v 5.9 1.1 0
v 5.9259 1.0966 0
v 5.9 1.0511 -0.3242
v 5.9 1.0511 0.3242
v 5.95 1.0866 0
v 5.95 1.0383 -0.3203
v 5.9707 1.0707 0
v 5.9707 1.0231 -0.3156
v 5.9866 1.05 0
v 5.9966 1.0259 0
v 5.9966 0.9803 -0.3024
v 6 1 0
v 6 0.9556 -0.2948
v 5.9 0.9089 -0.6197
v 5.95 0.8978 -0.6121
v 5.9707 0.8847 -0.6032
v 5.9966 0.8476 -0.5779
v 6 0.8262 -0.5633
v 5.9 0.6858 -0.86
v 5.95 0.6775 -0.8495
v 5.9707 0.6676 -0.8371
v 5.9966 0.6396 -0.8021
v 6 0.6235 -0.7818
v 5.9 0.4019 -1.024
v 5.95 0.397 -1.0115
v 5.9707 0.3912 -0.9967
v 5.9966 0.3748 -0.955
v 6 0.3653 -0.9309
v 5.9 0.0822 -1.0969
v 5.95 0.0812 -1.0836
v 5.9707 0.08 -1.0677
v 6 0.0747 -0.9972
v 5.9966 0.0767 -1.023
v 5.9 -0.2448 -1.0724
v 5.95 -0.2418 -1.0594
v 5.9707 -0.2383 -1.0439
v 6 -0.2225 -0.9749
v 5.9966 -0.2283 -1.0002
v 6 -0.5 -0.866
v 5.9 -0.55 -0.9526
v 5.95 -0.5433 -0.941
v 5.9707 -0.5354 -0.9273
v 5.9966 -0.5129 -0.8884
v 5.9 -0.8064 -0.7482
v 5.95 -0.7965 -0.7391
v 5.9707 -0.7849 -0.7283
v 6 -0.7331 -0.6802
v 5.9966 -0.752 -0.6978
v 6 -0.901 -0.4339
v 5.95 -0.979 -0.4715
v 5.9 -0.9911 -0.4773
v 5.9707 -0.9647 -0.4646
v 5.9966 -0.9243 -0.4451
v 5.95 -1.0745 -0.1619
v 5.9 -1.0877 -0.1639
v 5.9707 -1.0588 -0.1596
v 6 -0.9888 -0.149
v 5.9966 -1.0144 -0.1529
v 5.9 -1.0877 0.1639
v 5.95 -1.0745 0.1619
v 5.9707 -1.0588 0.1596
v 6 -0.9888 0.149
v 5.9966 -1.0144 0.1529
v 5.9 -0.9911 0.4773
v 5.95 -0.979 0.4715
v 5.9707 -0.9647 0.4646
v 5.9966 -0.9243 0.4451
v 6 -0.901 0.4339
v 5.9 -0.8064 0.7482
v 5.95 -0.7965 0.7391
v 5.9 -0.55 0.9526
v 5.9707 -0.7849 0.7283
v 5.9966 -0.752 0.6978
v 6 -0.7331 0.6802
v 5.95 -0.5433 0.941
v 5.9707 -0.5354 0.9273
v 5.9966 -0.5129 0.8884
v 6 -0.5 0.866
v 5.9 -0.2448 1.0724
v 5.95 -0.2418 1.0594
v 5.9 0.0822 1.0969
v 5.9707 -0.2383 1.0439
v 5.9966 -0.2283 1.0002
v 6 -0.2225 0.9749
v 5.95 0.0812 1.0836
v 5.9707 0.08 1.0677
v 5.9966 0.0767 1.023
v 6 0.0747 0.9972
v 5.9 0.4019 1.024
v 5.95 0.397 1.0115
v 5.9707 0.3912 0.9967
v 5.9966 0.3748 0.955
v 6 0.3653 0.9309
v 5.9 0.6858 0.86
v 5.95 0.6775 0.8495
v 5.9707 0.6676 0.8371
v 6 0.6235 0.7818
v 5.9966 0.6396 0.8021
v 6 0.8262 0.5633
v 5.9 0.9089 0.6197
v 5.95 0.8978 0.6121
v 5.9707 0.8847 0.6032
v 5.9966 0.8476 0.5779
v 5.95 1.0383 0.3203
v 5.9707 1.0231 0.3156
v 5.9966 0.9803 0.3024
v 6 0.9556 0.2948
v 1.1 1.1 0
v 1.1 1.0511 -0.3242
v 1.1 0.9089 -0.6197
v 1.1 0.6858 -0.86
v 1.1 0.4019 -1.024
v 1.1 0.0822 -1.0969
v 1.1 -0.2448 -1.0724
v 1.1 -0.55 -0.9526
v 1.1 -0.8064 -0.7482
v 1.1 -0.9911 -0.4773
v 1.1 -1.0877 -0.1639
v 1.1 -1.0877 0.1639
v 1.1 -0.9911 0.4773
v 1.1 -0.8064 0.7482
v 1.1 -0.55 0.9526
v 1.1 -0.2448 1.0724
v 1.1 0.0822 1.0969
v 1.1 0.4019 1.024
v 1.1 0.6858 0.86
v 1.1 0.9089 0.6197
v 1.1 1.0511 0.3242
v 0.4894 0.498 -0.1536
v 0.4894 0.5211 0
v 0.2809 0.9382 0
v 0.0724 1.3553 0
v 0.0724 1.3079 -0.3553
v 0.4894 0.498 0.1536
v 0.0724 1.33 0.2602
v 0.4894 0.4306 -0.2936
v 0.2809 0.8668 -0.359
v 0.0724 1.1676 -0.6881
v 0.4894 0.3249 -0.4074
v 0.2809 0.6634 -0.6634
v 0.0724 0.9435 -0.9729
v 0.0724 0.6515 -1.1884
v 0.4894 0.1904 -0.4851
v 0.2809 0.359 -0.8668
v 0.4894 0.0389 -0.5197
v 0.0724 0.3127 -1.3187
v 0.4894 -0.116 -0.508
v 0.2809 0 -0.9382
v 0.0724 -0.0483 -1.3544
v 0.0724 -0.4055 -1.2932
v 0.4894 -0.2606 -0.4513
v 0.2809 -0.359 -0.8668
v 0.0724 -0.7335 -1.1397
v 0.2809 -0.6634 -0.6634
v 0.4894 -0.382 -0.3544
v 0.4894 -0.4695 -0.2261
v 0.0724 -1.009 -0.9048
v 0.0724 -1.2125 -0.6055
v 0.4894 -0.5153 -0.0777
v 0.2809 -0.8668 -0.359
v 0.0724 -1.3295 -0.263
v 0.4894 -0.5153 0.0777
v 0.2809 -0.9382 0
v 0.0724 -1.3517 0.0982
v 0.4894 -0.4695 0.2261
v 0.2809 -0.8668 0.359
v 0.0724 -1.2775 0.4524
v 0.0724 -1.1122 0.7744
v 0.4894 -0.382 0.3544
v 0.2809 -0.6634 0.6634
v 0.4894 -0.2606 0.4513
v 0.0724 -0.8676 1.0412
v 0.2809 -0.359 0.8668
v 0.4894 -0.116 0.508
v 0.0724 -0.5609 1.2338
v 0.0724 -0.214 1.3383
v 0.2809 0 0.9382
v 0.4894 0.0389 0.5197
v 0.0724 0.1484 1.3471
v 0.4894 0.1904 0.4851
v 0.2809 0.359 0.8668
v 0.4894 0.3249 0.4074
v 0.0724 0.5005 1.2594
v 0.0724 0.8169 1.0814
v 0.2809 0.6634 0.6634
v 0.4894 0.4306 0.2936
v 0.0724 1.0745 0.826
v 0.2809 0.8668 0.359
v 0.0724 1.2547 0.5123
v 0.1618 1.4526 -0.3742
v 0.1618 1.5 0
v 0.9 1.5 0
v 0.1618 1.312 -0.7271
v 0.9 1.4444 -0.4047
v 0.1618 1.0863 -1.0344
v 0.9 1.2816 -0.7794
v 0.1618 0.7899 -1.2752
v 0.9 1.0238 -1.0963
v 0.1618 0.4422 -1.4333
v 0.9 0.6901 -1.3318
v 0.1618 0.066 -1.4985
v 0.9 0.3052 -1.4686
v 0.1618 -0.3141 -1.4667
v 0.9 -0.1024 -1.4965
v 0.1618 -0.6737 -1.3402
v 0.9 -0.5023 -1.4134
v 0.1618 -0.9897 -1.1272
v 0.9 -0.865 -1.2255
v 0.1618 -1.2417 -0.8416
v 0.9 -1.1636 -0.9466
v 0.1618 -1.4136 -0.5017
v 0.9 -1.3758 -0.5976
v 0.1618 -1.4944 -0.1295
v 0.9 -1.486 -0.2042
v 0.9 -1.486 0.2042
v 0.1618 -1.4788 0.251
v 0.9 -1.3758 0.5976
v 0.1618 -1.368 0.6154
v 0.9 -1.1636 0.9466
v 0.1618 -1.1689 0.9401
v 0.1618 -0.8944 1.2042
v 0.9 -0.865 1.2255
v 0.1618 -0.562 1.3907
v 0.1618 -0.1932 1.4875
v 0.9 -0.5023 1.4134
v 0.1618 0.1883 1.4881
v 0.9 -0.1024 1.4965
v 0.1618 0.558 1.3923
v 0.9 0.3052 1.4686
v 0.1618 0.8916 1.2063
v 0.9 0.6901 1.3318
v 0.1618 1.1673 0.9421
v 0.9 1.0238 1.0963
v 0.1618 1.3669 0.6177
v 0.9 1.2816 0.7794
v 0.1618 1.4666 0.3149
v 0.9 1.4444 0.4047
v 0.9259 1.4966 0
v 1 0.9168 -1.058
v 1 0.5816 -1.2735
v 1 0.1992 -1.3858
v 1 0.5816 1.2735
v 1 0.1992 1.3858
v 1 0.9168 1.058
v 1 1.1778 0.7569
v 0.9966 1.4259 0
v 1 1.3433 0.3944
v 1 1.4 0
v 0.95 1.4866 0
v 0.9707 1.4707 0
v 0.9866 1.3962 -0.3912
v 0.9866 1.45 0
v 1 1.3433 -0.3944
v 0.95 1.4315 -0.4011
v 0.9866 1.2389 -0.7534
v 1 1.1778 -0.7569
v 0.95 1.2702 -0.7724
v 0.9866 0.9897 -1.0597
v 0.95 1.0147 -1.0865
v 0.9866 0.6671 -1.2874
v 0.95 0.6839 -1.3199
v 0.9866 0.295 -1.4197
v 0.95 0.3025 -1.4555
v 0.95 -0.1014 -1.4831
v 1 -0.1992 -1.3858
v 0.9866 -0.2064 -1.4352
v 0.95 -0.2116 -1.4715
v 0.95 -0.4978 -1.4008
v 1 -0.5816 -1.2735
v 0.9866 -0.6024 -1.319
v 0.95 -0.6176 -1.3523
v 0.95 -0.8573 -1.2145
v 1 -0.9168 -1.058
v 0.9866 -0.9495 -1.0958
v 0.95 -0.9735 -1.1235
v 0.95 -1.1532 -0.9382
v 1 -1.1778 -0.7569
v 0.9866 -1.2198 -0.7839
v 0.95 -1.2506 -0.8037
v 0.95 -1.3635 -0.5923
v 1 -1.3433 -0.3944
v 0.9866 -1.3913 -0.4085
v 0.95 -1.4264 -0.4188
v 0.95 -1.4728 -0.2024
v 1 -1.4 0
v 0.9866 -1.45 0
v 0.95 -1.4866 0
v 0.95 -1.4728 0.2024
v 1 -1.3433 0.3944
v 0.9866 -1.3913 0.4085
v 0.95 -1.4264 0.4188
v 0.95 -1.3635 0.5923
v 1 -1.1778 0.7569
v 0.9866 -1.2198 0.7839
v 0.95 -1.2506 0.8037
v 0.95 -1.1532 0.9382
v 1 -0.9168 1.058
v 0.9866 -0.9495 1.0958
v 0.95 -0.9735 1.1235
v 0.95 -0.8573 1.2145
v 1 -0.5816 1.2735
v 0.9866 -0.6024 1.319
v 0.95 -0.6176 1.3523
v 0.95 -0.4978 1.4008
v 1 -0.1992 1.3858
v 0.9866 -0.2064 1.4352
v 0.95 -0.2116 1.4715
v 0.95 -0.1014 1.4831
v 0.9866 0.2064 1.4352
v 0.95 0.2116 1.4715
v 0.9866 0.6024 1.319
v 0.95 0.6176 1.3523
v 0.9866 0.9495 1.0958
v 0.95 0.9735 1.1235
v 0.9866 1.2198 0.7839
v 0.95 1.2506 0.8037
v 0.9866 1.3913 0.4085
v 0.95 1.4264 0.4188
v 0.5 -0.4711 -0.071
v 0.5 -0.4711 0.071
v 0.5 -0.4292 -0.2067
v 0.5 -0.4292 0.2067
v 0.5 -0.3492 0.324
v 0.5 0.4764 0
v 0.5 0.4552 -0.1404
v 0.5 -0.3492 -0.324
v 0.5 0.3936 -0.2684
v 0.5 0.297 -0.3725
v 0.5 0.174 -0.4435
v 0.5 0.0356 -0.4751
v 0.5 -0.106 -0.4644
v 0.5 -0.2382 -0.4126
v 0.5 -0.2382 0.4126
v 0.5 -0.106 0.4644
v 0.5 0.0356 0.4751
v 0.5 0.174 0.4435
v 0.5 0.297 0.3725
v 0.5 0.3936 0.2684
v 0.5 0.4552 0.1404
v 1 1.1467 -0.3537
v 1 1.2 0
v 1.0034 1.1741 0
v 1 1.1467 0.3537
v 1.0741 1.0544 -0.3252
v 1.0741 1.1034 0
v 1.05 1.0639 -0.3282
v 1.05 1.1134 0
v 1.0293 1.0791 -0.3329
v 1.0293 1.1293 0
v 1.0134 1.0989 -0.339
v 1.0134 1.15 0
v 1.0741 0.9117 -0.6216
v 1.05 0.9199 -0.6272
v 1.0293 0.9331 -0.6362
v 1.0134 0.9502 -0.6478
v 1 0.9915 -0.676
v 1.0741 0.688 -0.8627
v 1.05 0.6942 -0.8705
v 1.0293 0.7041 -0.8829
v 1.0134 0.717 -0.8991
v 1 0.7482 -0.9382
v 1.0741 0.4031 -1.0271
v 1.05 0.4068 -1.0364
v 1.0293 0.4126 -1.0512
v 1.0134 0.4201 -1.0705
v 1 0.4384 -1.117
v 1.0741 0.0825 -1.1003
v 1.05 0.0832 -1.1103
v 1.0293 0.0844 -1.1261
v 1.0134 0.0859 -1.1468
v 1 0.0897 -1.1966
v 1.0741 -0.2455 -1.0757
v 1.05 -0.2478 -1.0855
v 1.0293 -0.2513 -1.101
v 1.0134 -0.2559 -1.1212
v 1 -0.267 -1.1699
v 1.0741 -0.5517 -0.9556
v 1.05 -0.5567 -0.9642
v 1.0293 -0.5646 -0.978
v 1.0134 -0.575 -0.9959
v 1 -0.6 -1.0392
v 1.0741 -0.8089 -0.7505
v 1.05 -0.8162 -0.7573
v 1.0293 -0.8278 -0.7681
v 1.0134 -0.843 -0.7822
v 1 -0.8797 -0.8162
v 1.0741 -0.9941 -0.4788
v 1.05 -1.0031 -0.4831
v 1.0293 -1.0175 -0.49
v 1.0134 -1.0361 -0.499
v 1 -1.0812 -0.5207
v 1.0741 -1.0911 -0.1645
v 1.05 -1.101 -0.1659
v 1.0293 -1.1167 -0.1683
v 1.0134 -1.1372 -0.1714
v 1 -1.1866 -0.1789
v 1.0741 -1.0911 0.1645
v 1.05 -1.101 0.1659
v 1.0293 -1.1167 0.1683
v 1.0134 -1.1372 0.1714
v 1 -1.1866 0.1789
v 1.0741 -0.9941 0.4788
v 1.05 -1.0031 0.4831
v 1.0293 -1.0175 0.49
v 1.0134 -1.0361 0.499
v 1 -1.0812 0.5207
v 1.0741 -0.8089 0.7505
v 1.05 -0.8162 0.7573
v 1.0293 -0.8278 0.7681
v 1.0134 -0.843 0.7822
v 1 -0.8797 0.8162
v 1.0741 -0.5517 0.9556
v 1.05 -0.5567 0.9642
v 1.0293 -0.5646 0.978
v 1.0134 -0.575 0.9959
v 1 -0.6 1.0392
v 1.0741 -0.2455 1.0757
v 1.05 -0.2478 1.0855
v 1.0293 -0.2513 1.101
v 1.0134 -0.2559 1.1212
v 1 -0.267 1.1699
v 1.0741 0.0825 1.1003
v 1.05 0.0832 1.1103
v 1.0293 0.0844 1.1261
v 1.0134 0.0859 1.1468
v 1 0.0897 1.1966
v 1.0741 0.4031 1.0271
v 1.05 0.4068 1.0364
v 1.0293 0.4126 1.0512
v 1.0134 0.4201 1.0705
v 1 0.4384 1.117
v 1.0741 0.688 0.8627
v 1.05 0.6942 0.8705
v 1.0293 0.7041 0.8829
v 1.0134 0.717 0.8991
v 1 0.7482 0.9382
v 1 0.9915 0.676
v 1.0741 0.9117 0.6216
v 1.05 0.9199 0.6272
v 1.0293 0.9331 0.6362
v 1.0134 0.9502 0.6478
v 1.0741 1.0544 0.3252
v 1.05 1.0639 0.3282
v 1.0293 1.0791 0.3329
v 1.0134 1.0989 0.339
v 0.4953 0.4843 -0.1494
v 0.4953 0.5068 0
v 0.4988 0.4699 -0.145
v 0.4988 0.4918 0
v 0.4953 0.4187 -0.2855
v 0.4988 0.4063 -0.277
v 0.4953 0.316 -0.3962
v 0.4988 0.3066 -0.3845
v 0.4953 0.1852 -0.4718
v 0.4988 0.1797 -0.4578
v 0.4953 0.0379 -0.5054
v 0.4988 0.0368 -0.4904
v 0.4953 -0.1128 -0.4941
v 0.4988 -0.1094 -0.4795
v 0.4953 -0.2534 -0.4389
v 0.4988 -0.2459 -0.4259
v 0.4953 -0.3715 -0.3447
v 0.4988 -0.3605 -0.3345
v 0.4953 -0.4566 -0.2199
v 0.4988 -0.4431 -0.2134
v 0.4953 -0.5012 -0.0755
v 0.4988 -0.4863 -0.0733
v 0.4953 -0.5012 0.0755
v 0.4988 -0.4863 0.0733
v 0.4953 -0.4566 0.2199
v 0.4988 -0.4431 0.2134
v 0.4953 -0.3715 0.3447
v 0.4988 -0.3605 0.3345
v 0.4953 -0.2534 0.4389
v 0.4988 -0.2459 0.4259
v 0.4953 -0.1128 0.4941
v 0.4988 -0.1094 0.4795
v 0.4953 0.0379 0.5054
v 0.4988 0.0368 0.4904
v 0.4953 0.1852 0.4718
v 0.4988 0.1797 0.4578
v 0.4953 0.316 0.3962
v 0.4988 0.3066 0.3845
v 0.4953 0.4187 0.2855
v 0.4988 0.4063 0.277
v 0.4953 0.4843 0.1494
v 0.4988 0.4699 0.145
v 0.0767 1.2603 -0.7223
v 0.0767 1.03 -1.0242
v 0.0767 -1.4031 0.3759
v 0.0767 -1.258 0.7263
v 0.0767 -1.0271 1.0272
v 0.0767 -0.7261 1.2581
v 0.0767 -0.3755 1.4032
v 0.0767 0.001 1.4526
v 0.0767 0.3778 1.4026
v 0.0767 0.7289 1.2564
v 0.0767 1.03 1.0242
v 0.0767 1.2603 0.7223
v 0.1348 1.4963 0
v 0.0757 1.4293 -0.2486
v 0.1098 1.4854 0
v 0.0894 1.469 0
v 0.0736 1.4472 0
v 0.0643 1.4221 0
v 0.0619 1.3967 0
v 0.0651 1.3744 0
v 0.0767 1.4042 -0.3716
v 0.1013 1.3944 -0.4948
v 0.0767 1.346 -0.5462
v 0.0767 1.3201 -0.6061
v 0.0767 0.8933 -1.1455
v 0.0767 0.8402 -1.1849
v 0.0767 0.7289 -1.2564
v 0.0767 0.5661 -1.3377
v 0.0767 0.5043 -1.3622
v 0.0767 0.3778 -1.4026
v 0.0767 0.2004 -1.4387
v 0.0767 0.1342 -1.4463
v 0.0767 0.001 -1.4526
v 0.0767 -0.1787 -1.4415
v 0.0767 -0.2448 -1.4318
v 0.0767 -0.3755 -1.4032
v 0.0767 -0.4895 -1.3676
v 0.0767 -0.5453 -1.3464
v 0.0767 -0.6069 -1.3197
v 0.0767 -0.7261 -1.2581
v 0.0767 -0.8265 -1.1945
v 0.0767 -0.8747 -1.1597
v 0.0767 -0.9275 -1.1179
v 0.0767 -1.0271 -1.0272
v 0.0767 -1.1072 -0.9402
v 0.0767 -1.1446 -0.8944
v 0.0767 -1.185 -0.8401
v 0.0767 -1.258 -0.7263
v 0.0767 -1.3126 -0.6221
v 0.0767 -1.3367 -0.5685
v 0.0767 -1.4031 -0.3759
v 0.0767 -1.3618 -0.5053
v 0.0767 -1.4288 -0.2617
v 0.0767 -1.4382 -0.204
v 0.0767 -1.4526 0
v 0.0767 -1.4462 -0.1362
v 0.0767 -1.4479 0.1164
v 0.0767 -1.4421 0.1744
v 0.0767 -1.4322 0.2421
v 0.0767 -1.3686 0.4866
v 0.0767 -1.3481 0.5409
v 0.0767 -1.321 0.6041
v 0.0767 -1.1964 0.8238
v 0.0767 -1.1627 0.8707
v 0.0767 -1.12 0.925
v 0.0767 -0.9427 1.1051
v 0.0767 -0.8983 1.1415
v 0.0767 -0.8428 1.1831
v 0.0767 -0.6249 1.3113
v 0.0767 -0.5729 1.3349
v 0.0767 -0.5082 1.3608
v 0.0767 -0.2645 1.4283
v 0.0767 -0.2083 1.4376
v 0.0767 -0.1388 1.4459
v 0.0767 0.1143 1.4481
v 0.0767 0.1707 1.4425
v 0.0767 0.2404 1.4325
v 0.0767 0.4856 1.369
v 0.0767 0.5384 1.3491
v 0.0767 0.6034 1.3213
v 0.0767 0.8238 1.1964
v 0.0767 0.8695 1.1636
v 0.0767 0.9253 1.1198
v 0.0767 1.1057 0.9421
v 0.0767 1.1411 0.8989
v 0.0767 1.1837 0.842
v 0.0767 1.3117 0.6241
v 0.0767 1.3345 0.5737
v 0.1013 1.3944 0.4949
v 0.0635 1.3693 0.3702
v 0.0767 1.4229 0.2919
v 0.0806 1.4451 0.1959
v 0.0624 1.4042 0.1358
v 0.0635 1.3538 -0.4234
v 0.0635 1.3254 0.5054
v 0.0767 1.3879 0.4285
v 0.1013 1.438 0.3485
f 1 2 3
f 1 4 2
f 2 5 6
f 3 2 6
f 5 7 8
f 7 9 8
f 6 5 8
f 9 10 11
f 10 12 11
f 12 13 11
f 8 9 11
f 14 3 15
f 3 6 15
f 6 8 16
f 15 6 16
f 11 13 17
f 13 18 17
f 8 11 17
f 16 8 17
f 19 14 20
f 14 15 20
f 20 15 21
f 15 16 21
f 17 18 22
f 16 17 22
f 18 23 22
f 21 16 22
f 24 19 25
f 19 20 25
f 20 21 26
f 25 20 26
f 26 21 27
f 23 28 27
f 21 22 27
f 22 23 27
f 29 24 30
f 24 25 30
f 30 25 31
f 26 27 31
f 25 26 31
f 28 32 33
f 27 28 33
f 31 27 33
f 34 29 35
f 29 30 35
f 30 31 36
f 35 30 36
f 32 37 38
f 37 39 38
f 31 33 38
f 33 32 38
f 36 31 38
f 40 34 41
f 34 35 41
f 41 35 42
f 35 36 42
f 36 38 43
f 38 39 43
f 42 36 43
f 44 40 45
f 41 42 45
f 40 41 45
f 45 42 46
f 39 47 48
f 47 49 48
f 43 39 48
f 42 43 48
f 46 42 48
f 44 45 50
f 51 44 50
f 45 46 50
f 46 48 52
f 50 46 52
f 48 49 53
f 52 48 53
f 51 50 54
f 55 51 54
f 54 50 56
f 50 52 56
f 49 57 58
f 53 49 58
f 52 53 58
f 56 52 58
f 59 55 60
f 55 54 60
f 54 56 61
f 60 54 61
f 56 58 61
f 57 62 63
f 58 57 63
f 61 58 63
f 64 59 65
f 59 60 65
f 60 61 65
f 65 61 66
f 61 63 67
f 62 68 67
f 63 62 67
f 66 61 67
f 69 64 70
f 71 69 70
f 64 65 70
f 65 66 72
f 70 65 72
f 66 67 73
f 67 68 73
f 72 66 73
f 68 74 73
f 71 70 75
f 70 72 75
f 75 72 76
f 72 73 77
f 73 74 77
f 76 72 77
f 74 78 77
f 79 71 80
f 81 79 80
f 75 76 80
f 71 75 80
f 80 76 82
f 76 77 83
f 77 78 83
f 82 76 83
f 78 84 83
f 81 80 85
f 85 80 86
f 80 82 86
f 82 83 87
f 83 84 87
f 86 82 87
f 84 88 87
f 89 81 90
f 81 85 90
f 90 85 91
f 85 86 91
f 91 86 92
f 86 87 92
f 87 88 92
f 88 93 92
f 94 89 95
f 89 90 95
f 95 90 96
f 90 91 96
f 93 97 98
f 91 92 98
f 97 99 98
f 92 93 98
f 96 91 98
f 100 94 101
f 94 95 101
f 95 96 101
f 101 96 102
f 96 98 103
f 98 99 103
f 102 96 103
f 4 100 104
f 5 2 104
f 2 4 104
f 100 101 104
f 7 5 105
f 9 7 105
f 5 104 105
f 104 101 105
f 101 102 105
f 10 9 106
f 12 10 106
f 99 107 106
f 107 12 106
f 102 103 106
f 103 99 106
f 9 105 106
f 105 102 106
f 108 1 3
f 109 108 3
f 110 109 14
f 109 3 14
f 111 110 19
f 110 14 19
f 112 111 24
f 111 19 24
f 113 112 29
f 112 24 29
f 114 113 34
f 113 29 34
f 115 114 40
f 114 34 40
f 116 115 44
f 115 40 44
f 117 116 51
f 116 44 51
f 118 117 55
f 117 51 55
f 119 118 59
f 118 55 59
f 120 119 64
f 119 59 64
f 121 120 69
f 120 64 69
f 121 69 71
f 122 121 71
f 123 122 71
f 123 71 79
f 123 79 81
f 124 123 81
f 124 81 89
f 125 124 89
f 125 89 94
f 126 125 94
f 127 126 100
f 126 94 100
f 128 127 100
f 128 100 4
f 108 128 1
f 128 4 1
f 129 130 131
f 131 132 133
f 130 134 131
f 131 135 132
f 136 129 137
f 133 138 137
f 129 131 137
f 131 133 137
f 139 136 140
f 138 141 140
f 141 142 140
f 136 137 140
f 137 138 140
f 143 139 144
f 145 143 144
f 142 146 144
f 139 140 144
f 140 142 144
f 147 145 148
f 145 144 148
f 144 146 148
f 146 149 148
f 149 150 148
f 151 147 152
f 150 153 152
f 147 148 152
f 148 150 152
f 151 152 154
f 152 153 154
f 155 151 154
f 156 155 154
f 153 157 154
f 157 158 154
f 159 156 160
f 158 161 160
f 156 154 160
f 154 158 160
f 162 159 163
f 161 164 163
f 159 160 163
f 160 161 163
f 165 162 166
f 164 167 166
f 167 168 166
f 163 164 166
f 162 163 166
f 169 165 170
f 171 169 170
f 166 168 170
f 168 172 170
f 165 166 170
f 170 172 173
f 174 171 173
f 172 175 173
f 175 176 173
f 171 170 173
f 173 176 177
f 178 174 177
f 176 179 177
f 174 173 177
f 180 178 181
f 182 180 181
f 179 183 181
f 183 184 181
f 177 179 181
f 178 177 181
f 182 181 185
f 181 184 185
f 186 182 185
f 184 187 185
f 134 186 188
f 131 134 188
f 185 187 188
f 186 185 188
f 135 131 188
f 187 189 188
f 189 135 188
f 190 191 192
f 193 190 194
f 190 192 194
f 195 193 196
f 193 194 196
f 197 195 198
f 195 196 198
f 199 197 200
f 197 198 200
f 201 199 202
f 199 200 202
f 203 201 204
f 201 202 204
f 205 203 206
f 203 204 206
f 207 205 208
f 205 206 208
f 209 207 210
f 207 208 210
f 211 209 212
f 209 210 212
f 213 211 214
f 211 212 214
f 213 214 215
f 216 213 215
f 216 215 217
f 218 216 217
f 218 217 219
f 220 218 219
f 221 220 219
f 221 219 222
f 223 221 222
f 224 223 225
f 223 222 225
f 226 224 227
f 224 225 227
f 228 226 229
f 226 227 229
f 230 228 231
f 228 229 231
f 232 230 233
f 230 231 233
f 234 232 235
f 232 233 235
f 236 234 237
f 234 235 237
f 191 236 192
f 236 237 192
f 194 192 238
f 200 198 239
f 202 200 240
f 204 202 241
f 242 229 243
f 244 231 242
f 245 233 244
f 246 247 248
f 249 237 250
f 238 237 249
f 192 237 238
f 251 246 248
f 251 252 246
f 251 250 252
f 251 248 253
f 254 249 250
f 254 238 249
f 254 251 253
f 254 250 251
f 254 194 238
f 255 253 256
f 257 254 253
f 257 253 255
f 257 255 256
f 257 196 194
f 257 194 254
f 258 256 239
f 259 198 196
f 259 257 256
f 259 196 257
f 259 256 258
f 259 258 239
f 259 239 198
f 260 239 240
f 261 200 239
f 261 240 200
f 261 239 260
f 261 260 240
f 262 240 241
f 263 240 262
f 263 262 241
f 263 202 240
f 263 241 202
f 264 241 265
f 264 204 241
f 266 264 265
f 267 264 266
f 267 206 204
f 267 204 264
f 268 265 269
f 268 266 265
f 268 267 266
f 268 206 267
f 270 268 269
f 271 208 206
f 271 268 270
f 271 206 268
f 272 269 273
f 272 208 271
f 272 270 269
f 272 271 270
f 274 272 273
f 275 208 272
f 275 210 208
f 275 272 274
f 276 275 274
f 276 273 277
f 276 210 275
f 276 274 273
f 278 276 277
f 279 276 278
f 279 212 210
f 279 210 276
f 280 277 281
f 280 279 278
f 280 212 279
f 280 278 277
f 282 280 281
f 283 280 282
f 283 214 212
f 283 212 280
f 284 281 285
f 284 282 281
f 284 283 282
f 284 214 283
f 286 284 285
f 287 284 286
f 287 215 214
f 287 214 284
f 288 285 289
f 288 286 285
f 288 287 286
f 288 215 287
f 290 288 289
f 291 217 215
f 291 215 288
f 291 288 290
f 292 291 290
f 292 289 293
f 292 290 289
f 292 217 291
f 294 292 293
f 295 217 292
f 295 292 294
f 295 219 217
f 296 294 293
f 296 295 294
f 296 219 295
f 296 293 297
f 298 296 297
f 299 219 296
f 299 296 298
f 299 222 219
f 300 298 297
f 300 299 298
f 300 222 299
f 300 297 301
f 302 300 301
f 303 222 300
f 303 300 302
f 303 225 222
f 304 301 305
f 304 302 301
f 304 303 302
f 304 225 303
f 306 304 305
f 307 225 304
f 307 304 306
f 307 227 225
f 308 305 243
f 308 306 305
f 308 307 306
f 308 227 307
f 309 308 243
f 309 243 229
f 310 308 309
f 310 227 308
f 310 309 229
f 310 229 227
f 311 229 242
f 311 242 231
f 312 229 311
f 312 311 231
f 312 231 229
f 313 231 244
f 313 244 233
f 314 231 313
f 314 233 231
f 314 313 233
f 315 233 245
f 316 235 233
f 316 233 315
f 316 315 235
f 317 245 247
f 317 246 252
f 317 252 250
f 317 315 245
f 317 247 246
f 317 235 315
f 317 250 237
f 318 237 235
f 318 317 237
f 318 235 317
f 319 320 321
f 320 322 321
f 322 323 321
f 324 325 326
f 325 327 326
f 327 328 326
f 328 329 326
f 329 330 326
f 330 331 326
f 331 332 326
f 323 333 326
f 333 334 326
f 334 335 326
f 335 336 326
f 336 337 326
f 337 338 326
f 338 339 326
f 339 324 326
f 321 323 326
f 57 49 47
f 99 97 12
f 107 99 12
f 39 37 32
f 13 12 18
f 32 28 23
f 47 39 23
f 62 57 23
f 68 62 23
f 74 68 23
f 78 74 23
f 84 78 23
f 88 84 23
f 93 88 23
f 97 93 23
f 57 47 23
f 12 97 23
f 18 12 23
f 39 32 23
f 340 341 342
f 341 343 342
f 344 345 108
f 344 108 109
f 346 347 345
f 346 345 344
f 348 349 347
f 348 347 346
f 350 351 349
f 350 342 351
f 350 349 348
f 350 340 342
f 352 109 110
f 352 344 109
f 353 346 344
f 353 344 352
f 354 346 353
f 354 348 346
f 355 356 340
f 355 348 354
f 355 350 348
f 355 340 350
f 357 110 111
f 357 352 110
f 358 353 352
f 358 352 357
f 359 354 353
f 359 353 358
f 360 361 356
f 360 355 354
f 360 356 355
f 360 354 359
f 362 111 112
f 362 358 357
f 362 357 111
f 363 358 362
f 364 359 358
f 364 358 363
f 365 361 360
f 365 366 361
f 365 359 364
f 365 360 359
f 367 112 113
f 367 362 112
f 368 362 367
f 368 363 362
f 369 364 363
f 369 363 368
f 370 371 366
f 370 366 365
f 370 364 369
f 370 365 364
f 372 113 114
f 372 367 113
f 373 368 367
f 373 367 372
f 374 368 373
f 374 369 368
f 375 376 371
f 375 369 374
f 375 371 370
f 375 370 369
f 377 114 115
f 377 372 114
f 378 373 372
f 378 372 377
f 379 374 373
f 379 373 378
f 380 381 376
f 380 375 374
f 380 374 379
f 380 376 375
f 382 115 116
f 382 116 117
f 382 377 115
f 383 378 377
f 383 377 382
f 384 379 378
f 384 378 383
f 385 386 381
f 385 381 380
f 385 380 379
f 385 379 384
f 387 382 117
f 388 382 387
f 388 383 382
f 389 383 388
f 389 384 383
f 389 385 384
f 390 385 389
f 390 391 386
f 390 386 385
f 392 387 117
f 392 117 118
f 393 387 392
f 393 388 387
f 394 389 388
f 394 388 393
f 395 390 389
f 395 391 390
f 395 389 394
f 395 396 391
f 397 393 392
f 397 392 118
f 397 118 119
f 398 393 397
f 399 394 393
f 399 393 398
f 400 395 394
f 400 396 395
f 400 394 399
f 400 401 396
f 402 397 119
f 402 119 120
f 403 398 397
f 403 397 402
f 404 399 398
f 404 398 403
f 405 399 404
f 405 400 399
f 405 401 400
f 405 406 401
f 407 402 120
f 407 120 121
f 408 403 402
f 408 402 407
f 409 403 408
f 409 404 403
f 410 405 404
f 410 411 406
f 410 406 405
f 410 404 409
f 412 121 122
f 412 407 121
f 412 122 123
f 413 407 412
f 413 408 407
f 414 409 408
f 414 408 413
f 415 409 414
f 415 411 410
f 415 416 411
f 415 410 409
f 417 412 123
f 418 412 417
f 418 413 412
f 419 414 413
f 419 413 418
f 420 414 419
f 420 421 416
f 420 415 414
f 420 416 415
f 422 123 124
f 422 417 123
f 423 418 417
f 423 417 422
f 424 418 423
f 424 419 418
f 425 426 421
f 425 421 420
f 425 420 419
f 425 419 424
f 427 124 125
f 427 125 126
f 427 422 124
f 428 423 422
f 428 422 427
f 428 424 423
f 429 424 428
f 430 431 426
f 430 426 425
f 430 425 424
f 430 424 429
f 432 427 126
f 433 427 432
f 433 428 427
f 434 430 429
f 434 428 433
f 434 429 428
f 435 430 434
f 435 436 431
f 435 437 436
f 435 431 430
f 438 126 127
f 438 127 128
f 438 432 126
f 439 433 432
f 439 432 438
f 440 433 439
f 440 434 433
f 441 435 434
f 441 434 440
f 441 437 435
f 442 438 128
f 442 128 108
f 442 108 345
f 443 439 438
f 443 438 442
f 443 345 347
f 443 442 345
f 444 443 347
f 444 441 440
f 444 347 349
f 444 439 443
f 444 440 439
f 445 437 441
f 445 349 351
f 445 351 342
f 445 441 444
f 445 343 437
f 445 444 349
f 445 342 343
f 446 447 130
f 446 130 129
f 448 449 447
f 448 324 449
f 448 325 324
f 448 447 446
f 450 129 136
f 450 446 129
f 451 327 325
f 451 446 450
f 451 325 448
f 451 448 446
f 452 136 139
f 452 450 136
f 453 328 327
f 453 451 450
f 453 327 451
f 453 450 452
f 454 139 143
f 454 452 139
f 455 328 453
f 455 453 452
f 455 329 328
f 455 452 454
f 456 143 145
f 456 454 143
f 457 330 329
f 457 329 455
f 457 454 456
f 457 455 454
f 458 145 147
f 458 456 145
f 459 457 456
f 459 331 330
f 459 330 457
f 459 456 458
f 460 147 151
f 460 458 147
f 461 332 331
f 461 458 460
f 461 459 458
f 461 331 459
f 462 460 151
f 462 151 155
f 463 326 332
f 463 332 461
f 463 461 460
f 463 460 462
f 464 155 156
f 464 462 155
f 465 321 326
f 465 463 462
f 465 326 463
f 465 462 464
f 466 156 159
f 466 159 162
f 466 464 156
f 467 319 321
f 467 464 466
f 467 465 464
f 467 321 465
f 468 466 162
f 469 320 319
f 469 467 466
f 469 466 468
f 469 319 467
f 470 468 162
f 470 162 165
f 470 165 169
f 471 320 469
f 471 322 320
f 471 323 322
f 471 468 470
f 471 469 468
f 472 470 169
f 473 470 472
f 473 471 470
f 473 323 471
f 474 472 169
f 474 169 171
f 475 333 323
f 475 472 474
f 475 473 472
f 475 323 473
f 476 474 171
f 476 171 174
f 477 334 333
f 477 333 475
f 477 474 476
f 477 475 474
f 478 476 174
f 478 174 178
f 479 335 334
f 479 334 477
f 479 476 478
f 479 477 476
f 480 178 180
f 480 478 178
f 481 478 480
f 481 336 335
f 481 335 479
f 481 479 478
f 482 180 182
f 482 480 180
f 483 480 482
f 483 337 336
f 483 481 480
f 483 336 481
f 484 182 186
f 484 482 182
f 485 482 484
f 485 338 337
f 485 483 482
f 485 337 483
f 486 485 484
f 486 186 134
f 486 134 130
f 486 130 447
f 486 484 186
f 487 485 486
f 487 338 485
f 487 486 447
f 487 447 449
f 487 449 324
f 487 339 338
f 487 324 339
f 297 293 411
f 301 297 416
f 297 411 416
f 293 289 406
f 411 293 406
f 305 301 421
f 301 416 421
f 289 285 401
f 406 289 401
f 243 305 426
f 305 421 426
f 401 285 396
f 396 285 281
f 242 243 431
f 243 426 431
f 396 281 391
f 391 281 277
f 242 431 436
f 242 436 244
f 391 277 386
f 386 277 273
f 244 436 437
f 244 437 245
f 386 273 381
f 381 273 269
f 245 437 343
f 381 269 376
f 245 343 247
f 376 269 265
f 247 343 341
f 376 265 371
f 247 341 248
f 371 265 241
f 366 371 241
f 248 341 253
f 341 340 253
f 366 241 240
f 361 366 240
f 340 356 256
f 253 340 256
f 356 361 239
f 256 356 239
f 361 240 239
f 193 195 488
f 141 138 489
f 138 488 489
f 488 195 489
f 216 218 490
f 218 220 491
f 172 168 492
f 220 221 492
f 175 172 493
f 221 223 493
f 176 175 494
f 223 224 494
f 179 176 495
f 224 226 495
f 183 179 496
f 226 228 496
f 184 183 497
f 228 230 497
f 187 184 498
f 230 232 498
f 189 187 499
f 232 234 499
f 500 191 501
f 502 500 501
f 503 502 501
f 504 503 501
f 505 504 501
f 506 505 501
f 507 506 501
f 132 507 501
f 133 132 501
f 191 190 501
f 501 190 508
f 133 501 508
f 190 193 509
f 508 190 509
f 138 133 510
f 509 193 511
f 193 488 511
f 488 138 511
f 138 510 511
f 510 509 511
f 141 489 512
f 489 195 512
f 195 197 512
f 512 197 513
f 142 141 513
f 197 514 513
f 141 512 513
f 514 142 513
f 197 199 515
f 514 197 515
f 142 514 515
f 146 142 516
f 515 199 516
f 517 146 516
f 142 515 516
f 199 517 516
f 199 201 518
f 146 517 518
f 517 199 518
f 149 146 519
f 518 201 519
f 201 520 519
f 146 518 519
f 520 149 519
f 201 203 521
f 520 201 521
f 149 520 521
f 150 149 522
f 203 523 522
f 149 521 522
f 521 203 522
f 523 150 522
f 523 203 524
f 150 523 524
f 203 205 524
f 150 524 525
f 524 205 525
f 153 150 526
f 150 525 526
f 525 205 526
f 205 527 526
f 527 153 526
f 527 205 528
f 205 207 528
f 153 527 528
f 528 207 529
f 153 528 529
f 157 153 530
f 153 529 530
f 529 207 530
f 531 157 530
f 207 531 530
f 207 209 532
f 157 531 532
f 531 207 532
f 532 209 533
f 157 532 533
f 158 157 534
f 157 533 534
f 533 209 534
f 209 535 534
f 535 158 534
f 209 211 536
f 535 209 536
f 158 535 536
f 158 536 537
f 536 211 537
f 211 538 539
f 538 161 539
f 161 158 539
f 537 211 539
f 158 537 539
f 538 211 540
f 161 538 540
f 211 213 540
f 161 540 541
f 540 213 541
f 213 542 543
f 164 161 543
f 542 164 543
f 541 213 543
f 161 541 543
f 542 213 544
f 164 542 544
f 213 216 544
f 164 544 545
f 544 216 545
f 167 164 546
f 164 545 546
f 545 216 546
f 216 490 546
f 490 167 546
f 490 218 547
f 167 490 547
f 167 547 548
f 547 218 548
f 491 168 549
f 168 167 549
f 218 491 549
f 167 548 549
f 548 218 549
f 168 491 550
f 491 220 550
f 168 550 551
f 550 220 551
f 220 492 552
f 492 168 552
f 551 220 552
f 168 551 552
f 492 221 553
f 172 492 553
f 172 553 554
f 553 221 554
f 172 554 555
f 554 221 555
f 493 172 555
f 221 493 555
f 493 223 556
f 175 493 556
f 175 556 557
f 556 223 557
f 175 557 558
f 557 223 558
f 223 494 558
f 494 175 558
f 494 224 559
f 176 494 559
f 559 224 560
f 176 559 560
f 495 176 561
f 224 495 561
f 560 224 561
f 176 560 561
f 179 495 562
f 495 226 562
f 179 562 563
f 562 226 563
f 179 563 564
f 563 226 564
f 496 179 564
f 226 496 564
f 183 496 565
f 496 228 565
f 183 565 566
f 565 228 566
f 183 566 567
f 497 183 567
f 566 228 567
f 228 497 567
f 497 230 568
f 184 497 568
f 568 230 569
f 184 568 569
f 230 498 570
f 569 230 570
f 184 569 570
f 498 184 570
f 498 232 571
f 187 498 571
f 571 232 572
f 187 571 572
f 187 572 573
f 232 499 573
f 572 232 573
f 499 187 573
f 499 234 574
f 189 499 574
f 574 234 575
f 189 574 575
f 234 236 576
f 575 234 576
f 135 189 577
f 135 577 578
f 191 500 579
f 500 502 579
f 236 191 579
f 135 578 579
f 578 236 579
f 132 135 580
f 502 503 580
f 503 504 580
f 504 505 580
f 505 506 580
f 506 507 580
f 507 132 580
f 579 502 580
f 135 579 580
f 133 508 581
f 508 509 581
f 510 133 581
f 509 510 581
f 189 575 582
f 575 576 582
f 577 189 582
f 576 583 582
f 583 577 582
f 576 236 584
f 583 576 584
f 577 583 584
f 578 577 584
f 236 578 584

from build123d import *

# Parameters (mm, degrees)
FILLET1_R = 0.1
FILLET2_R = 0.1


with BuildPart() as part:
    # Sketch1 → Revolve1 (revolve)
    with BuildSketch(Plane.XY):
        Polygon((0, 1.5), (1, 1.5), (1, 1.1), (6, 1.1), (6, 0), (0.5, 0), (0.5, 0.5), align=None)
    revolve(axis=Axis((6, 0, 0), (-1, 0, 0)))

    # Fillet1
    fillet1_edges = [part.edges().sort_by_distance(p)[0] for p in [
        (6, -1.1, 0),
    ]]
    fillet(fillet1_edges, radius=FILLET1_R)

    # Fillet2
    fillet2_edges = [part.edges().sort_by_distance(p)[0] for p in [
        (0.5, -0.5, 0),
        (1, -1.1, 0),
        (1, -1.5, 0),
        (0, -1.5, 0),
    ]]
    fillet(fillet2_edges, radius=FILLET2_R)


solid = part.part
